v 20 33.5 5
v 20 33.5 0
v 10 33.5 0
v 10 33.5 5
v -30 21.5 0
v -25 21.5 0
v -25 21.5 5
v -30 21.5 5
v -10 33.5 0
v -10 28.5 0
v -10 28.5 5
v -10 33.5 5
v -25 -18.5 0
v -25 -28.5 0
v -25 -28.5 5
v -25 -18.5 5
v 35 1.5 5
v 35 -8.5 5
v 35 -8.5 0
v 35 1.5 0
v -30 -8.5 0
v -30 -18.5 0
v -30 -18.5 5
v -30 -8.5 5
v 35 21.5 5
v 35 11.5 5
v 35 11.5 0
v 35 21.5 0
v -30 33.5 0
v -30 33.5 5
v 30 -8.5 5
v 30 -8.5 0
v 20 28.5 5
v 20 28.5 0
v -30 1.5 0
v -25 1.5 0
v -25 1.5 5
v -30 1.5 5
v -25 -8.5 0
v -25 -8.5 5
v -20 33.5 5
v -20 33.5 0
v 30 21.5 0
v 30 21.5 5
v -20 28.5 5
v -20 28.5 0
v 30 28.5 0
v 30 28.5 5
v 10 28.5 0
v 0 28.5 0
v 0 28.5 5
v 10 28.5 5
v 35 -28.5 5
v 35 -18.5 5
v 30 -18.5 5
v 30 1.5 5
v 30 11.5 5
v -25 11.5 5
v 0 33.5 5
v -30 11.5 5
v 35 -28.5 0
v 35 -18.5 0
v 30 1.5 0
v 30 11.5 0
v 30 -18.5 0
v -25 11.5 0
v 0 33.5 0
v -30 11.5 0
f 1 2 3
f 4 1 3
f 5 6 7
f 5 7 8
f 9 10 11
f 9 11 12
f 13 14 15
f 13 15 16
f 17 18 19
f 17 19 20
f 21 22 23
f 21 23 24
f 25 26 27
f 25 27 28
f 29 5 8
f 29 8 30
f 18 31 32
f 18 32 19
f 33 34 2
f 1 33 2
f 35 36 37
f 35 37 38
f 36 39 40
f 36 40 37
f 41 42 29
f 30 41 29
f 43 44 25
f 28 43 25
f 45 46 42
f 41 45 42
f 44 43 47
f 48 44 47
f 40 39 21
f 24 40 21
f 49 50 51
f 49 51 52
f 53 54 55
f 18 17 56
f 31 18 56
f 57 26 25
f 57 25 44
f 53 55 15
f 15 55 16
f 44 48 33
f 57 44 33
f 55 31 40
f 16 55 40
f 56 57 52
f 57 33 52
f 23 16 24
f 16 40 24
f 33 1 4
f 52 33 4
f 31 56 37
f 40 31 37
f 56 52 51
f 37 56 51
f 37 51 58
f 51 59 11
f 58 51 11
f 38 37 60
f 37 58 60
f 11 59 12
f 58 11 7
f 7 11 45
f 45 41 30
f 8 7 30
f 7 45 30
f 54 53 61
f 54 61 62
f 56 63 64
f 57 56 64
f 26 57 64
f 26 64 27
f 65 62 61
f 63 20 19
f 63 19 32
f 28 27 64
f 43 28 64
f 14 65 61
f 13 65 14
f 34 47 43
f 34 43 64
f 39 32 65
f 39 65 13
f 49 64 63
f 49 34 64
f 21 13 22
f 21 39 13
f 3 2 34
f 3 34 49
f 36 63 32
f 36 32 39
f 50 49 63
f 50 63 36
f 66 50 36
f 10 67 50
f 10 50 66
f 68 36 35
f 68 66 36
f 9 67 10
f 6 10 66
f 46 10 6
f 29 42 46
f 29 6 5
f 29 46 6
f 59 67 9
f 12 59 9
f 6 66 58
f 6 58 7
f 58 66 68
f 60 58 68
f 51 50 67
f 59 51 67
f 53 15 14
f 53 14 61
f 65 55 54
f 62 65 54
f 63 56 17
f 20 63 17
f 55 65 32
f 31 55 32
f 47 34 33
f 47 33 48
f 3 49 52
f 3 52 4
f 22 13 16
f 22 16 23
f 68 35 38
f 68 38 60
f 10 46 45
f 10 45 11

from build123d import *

# Parameters (mm, degrees)
SKETCH_1_W             = 60
SKETCH_1_H             = 57
EXTRUDE_1_DEPTH        = 5
SKETCH_2_W             = 5
SKETCH_2_H             = 10
EXTRUDE_3_DEPTH        = 5
PATTERN_LINEAR_2_COUNT = 3
PATTERN_LINEAR_2_PITCH = 20
SKETCH_3_W             = 10
SKETCH_3_H             = 5
EXTRUDE_4_DEPTH        = 5
PATTERN_LINEAR_3_COUNT = 3
PATTERN_LINEAR_3_PITCH = 20
CUT_EXTRUDE_1_REACH    = 50.706
SKETCH_4_W             = 5
SKETCH_4_H             = 10
PATTERN_LINEAR_4_COUNT = 3
PATTERN_LINEAR_4_PITCH = 20


with BuildPart() as part:
    # 스케치1 → 보스-돌출1 (new body)
    with BuildSketch(Plane.XY):
        Rectangle(SKETCH_1_W, SKETCH_1_H)
    extrude(amount=EXTRUDE_1_DEPTH)

    # 스케치2 → 보스-돌출3 (add)
    with BuildSketch(Plane.XY.offset(5)):
        with Locations((32.5, -23.5)):
            Rectangle(SKETCH_2_W, SKETCH_2_H)
    extrude_3 = extrude(amount=-EXTRUDE_3_DEPTH)

    # 선형 패턴2: 보스-돌출3 ×3
    with Locations(*[(0, i * PATTERN_LINEAR_2_PITCH, 0) for i in range(1, PATTERN_LINEAR_2_COUNT)]):
        add(extrude_3)

    # 스케치3 → 보스-돌출4 (add)
    with BuildSketch(Plane(origin=(0, 0, 0), x_dir=(-1, 0, 0), z_dir=(0, 0, -1))):
        with Locations((25, 31)):
            Rectangle(SKETCH_3_W, SKETCH_3_H)
    extrude_4 = extrude(amount=-EXTRUDE_4_DEPTH)

    # 선형 패턴3: 보스-돌출4 ×3
    with Locations(*[(i * PATTERN_LINEAR_3_PITCH, 0, 0) for i in range(1, PATTERN_LINEAR_3_COUNT)]):
        add(extrude_4)

    # 스케치4 → 컷-돌출1 (cut, up to next)
    with BuildSketch(Plane(origin=(0, 0, 0), x_dir=(-1, 0, 0), z_dir=(0, 0, -1)), mode=Mode.PRIVATE) as cut_extrude_1_sk1:
        with Locations((27.5, -23.5)):
            Rectangle(SKETCH_4_W, SKETCH_4_H)
    cut_extrude_1_tool1 = extrude(cut_extrude_1_sk1.sketch, amount=-CUT_EXTRUDE_1_REACH, mode=Mode.PRIVATE) & part.part
    cut_extrude_1 = cut_extrude_1_tool1.solids().sort_by_distance((-27.5, -23.5, 0))[0]
    add(cut_extrude_1, mode=Mode.SUBTRACT)

    # 선형 패턴4: 컷-돌출1 ×3
    with Locations(*[(0, i * PATTERN_LINEAR_4_PITCH, 0) for i in range(1, PATTERN_LINEAR_4_COUNT)]):
        add(cut_extrude_1, mode=Mode.SUBTRACT)


solid = part.part
